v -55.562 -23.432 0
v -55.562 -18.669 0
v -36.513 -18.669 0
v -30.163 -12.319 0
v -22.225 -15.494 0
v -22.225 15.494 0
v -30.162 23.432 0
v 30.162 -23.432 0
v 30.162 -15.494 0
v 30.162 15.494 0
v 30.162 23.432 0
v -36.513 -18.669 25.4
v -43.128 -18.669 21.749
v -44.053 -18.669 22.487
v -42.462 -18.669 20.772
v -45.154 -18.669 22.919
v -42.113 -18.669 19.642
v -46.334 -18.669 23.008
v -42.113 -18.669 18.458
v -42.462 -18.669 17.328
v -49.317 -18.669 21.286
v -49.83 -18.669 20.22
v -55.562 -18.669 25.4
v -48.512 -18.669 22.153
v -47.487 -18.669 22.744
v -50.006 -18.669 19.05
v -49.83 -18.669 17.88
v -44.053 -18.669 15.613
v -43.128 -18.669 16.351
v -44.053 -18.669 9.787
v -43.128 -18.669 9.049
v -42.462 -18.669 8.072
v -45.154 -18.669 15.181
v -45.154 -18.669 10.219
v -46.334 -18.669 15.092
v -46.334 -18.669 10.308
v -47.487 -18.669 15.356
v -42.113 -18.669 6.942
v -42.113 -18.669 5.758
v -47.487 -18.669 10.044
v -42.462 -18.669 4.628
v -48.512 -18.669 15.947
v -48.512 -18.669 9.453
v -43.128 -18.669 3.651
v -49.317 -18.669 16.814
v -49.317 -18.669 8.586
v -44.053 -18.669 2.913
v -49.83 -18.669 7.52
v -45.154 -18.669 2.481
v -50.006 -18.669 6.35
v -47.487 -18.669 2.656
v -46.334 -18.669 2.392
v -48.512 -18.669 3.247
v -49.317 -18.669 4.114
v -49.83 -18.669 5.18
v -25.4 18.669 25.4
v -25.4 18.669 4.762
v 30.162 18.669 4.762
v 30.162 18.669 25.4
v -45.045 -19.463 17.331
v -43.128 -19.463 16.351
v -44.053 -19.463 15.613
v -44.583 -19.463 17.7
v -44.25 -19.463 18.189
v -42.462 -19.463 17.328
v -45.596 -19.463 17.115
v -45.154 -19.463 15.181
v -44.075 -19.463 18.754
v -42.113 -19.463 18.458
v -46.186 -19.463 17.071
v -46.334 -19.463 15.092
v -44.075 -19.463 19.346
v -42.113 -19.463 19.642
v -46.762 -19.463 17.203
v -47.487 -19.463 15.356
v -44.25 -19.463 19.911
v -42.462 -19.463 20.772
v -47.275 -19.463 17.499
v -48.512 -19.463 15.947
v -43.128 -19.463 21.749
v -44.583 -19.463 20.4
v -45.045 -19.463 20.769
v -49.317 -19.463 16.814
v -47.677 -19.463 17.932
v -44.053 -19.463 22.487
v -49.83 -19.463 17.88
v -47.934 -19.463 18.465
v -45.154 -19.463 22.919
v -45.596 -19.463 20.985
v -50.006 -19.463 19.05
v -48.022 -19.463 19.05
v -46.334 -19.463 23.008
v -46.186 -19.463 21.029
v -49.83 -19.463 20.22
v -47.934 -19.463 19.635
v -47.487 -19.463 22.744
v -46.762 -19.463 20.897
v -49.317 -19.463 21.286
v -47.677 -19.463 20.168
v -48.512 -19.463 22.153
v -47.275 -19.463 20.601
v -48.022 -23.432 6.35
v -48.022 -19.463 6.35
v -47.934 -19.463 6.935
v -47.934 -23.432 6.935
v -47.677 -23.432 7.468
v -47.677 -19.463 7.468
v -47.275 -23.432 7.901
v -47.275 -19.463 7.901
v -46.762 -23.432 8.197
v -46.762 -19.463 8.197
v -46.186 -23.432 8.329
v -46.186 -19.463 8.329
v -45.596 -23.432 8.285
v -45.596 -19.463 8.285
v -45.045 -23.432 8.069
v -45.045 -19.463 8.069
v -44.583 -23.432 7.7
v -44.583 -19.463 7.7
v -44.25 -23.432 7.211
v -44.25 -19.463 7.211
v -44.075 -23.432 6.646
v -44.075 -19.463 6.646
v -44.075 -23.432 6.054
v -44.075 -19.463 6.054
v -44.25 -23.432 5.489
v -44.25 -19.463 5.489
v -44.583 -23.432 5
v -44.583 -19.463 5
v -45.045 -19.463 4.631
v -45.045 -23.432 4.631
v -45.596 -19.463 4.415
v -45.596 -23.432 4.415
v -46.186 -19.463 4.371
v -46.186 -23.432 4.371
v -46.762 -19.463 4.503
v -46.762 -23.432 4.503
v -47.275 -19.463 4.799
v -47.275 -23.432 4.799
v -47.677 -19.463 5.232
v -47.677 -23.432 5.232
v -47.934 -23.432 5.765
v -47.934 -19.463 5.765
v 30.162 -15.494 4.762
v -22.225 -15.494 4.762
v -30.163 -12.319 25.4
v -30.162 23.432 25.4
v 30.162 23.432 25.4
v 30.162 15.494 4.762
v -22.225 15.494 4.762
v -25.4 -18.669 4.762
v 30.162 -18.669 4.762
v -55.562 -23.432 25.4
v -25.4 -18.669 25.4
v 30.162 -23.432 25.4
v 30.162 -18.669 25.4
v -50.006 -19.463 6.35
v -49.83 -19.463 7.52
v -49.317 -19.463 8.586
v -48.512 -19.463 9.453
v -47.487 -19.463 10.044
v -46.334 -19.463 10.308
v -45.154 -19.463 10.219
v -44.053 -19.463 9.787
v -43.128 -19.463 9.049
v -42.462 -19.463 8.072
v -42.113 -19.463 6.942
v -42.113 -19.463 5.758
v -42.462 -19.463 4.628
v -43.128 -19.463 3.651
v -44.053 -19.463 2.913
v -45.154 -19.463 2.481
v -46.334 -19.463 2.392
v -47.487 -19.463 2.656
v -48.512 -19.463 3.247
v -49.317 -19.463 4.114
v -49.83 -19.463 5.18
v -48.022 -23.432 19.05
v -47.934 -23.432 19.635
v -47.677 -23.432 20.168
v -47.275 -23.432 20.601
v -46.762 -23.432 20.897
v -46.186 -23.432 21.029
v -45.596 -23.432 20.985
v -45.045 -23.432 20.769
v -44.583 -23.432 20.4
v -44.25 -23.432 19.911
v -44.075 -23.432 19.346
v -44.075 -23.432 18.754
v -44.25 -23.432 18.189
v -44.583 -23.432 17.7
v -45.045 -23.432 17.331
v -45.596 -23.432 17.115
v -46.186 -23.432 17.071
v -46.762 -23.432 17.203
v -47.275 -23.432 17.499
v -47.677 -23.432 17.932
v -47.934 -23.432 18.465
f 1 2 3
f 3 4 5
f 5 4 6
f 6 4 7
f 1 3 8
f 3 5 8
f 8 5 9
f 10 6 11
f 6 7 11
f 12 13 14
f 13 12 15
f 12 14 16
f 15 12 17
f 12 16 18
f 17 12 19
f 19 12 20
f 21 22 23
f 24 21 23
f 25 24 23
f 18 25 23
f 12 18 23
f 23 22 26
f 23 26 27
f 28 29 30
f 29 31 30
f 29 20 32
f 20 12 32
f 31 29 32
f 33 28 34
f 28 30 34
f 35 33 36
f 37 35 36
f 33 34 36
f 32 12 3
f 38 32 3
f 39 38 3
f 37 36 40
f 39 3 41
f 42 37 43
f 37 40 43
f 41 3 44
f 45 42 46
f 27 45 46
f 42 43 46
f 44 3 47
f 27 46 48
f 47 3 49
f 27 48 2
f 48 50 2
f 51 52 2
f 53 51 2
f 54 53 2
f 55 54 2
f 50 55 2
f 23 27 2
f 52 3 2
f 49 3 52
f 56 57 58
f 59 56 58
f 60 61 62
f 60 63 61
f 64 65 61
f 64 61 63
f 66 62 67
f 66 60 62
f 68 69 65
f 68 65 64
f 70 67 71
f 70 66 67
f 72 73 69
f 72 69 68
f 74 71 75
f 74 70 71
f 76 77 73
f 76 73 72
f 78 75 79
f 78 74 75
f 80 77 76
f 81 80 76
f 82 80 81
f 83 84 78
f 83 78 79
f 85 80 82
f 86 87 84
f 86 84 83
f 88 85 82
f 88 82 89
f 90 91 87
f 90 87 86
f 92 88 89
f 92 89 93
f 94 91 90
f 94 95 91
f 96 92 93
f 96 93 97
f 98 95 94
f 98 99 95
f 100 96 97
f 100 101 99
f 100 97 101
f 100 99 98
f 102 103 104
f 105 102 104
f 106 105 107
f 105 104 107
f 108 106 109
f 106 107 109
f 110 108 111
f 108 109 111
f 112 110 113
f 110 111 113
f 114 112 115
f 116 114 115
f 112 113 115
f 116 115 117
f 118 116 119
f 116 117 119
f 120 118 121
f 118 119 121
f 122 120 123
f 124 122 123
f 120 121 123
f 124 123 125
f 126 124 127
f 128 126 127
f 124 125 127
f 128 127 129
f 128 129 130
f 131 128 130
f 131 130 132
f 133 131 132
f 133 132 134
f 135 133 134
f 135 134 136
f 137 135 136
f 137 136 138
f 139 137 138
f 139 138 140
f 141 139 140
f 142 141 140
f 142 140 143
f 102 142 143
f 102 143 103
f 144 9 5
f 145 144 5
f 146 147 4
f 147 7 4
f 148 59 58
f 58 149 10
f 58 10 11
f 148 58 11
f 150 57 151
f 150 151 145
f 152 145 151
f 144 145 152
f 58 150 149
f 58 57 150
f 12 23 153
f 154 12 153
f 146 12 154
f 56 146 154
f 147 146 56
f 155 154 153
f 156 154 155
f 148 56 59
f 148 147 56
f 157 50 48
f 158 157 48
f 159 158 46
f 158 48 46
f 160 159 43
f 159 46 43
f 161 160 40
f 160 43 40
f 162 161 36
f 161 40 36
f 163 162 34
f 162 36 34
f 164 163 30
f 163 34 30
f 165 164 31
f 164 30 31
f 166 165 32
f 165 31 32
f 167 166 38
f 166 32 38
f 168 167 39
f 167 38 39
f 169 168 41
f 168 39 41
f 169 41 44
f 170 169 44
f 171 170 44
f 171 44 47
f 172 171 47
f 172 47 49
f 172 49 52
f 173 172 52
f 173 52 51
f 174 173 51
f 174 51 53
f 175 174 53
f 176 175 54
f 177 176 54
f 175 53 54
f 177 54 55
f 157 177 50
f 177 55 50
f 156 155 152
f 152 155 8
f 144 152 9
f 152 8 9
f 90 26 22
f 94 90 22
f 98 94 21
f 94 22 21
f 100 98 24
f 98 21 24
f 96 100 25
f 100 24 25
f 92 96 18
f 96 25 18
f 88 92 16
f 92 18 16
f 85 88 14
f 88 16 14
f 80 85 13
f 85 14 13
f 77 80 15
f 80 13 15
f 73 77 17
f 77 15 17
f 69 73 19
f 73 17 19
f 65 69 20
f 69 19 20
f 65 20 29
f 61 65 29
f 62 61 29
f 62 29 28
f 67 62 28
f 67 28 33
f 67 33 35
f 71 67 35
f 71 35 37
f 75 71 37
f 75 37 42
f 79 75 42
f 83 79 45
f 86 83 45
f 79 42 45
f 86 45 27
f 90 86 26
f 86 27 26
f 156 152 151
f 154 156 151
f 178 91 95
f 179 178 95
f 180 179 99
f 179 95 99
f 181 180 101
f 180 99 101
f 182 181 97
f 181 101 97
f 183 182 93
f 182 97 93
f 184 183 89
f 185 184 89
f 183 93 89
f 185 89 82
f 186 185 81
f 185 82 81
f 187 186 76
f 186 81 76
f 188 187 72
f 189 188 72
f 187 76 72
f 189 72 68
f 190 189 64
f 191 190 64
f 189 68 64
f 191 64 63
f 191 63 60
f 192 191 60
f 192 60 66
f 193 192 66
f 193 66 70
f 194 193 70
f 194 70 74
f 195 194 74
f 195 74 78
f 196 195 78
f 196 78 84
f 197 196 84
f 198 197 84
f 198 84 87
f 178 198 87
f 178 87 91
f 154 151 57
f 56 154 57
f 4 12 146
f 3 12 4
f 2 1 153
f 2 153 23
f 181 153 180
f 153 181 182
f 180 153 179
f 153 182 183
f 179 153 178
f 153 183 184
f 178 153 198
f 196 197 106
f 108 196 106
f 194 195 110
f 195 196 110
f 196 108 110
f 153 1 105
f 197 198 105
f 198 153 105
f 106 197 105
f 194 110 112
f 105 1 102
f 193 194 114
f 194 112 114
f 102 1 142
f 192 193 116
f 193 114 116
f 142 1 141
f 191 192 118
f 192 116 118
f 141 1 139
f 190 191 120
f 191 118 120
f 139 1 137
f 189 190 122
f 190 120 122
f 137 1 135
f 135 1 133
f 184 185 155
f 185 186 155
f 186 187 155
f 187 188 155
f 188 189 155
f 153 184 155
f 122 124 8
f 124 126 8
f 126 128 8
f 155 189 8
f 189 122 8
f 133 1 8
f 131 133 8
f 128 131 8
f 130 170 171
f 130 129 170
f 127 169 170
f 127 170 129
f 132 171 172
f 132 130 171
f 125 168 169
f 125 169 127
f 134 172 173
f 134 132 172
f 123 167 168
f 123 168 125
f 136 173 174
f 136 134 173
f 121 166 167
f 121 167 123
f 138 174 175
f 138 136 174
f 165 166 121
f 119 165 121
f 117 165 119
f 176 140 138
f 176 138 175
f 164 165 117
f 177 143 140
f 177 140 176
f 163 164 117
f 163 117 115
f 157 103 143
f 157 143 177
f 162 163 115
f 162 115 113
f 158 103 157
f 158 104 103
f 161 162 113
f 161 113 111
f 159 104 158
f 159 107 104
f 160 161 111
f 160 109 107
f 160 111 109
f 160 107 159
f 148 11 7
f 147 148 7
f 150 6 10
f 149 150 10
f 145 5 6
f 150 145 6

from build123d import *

# Parameters (mm, degrees)
F0_W     = 4.7625
F0_H     = 3.175
F0_W_2   = 25.4
F0_H_2   = 4.7625
F1_DEPTH = 4.7625
F2_DEPTH = 25.4
F3_SIZE  = 6.35
F4_R     = 3.96875
F4_R_2   = 1.984375
F5_DEPTH = 0.79375
F6_DEPTH = 4.7625


with BuildPart() as f1:
    # F0 (on Top) → F1 (new body)
    with BuildSketch(Plane.XY):
        with Locations((27.78125, 17.0815)):
            Rectangle(F0_W, F0_H)
        with Locations((27.78125, -17.0815)):
            Rectangle(F0_W, F0_H)
        with Locations((-42.8625, -21.05025)):
            Rectangle(F0_W_2, F0_H_2)
        Polygon((25.4, -18.669), (-25.4, -18.669), (-30.1625, -18.669), (-30.1625, -23.4315), (30.1625, -23.4315), (30.1625, -18.669), align=None)
        Polygon((-25.4, 18.669), (25.4, 18.669), (30.1625, 18.669), (30.1625, 23.4315), (-30.1625, 23.4315), (-30.1625, -18.669), (-25.4, -18.669), align=None)
        Polygon((25.4, 15.494), (25.4, 18.669), (-25.4, 18.669), (-25.4, -18.669), (25.4, -18.669), (25.4, -15.494), (-22.225, -15.494), (-22.225, 15.494), align=None)
    extrude(amount=F1_DEPTH)

    # F0 (on Top) → F2 (join)
    with BuildSketch(Plane.XY):
        with Locations((-42.8625, -21.05025)):
            Rectangle(F0_W_2, F0_H_2)
        Polygon((25.4, -18.669), (-25.4, -18.669), (-30.1625, -18.669), (-30.1625, -23.4315), (30.1625, -23.4315), (30.1625, -18.669), align=None)
        Polygon((-25.4, 18.669), (25.4, 18.669), (30.1625, 18.669), (30.1625, 23.4315), (-30.1625, 23.4315), (-30.1625, -18.669), (-25.4, -18.669), align=None)
    extrude(amount=F2_DEPTH)

    # F3
    f3_edges = [f1.edges().sort_by_distance(p)[0] for p in [
        (-30.1625, -18.669, 12.7),
    ]]
    chamfer(f3_edges, length=F3_SIZE)

    # F4 (on face) → F5 (cut)
    with BuildSketch(Plane(origin=(0, -18.669, 0), x_dir=(-1, 0, 0), z_dir=(0, 1, 0))):
        with Locations((46.0375, 6.35)):
            Circle(F4_R)
        with Locations((46.0375, 6.35)):
            Circle(F4_R_2, mode=Mode.SUBTRACT)
        with Locations((46.0375, 19.05)):
            Circle(F4_R)
        with Locations((46.0375, 19.05)):
            Circle(F4_R_2, mode=Mode.SUBTRACT)
    extrude(amount=-F5_DEPTH, mode=Mode.SUBTRACT)

    # F6 (cut, through all): faces of the model
    f6_faces = [f1.faces().sort_by_distance(p)[0] for p in [
        (-46.0375, -18.669, 6.35),
        (-46.0375, -18.669, 19.05),
    ]]
    extrude(f6_faces, amount=-F6_DEPTH, mode=Mode.SUBTRACT)


solid = f1.part
